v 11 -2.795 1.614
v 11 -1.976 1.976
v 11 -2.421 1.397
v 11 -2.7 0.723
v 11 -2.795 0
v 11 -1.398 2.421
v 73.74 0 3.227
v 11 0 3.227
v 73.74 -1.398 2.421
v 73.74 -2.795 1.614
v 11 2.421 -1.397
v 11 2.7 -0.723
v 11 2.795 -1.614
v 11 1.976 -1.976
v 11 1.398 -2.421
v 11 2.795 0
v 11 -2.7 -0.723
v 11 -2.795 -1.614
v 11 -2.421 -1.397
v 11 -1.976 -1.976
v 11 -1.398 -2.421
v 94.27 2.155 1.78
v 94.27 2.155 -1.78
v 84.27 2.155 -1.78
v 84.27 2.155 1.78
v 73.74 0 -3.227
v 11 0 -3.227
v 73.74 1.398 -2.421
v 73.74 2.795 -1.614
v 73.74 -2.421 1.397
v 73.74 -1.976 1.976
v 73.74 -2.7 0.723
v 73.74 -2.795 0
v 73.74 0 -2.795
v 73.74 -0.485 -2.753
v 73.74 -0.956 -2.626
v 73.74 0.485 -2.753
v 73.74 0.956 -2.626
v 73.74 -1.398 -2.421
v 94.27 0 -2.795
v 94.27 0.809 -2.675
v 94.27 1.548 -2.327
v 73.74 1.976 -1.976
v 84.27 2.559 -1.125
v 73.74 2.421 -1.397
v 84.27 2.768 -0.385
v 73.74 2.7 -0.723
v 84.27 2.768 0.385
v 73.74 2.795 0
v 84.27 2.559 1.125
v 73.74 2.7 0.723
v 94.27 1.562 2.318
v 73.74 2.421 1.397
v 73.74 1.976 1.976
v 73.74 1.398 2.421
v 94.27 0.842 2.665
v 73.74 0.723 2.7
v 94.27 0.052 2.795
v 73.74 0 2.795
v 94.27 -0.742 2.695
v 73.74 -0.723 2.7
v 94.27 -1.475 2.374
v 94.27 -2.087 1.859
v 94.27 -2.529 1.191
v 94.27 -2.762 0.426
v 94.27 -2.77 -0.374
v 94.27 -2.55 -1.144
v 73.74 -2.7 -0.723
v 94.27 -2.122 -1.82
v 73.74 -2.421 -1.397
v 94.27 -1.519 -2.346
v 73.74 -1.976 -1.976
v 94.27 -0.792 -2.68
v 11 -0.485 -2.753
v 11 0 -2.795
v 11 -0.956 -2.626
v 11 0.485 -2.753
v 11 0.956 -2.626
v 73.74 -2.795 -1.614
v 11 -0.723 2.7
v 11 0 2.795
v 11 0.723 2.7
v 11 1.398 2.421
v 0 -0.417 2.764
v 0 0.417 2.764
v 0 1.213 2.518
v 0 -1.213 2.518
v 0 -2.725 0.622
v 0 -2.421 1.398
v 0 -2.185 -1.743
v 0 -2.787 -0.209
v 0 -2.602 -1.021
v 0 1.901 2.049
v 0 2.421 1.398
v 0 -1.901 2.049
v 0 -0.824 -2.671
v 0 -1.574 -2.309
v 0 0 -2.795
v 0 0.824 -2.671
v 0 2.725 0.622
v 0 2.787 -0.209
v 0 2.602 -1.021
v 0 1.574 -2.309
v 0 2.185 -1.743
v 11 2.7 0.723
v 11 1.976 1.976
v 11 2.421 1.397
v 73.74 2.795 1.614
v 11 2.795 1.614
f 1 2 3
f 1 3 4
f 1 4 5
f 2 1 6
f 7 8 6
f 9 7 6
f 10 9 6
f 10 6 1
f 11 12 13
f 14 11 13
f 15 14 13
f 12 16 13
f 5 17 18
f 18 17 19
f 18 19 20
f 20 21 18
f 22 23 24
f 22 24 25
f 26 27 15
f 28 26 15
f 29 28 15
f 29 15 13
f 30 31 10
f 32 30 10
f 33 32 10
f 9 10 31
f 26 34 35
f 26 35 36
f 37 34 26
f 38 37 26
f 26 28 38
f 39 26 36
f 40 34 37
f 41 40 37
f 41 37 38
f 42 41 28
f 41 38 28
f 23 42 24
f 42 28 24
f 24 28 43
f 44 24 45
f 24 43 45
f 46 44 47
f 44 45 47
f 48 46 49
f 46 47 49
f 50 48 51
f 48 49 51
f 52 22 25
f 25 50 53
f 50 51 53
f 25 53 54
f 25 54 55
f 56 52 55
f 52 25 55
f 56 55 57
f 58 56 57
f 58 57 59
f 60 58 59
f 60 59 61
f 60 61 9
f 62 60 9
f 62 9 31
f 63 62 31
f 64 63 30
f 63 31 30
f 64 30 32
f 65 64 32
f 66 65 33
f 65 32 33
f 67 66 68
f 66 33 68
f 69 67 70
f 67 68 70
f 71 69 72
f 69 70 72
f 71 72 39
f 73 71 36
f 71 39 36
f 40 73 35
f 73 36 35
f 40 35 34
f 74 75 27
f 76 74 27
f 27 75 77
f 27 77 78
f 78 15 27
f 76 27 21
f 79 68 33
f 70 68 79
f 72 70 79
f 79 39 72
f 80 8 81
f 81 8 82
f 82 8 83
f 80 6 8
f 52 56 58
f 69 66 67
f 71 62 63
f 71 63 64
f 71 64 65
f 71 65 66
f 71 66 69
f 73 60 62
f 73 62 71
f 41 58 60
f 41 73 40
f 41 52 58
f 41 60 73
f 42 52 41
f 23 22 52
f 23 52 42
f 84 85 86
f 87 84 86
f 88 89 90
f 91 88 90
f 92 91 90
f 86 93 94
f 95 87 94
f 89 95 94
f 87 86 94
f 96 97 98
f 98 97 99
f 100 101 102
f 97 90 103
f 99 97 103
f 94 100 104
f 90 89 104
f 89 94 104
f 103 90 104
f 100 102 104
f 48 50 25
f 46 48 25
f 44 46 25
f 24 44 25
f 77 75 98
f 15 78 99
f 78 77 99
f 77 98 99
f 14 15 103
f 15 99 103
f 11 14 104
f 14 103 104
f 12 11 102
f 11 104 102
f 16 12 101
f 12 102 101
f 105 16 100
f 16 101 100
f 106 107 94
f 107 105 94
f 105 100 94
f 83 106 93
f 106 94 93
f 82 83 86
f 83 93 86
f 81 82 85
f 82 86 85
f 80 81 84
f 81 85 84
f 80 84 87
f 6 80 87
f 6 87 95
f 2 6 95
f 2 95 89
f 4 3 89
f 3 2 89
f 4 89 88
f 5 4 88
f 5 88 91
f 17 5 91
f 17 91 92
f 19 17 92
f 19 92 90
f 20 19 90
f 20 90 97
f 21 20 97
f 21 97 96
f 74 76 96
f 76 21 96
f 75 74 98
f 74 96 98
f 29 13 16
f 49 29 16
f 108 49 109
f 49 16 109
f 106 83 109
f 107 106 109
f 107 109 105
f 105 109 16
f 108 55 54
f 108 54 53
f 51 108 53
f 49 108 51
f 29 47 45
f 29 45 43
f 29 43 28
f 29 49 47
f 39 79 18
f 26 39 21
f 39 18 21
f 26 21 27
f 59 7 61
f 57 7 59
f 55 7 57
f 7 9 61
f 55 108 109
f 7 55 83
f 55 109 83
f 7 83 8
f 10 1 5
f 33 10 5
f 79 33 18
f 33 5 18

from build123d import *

# Parameters (mm, degrees)
SKIZZE1_R                       = 2.795
AUFSATZ_LINEAR_AUSTRAGEN1_DEPTH = 94.27
AUFSATZ_LINEAR_AUSTRAGEN2_DEPTH = 62.74
SCHNITT_LINEAR_START            = 94.27
SCHNITT_LINEAR_AUSTRAGEN1_DEPTH = 10


with BuildPart() as part:
    # Skizze1 → Aufsatz-Linear austragen1 (new body)
    with BuildSketch(Plane(origin=(0, 0, 0), x_dir=(0, 0, -1), z_dir=(1, 0, 0))):
        Circle(SKIZZE1_R)
    extrude(amount=AUFSATZ_LINEAR_AUSTRAGEN1_DEPTH)

    # Skizze2 → Aufsatz-Linear austragen2 (add)
    with BuildSketch(Plane(origin=(11, 0, 0), x_dir=(0, 0, -1), z_dir=(1, 0, 0))):
        Polygon((1.613694002, 2.795), (-1.613694002, 2.795), (-3.227388005, 0), (-1.613694002, -2.795), (1.613694002, -2.795), (3.227388005, 0), align=None)
    extrude(amount=AUFSATZ_LINEAR_AUSTRAGEN2_DEPTH)

    # Skizze3 → Schnitt-Linear austragen1 (cut)
    with BuildSketch(Plane(origin=(0, 0, 0), x_dir=(0, 0, -1), z_dir=(1, 0, 0)).offset(SCHNITT_LINEAR_START)):
        with BuildLine():
            Line((1.779887637, 2.155), (-1.779887637, 2.155))
            ThreePointArc((-1.779887637, 2.155), (0, 2.795), (1.779887637, 2.155))
        make_face()
    extrude(amount=-SCHNITT_LINEAR_AUSTRAGEN1_DEPTH, mode=Mode.SUBTRACT)


solid = part.part
